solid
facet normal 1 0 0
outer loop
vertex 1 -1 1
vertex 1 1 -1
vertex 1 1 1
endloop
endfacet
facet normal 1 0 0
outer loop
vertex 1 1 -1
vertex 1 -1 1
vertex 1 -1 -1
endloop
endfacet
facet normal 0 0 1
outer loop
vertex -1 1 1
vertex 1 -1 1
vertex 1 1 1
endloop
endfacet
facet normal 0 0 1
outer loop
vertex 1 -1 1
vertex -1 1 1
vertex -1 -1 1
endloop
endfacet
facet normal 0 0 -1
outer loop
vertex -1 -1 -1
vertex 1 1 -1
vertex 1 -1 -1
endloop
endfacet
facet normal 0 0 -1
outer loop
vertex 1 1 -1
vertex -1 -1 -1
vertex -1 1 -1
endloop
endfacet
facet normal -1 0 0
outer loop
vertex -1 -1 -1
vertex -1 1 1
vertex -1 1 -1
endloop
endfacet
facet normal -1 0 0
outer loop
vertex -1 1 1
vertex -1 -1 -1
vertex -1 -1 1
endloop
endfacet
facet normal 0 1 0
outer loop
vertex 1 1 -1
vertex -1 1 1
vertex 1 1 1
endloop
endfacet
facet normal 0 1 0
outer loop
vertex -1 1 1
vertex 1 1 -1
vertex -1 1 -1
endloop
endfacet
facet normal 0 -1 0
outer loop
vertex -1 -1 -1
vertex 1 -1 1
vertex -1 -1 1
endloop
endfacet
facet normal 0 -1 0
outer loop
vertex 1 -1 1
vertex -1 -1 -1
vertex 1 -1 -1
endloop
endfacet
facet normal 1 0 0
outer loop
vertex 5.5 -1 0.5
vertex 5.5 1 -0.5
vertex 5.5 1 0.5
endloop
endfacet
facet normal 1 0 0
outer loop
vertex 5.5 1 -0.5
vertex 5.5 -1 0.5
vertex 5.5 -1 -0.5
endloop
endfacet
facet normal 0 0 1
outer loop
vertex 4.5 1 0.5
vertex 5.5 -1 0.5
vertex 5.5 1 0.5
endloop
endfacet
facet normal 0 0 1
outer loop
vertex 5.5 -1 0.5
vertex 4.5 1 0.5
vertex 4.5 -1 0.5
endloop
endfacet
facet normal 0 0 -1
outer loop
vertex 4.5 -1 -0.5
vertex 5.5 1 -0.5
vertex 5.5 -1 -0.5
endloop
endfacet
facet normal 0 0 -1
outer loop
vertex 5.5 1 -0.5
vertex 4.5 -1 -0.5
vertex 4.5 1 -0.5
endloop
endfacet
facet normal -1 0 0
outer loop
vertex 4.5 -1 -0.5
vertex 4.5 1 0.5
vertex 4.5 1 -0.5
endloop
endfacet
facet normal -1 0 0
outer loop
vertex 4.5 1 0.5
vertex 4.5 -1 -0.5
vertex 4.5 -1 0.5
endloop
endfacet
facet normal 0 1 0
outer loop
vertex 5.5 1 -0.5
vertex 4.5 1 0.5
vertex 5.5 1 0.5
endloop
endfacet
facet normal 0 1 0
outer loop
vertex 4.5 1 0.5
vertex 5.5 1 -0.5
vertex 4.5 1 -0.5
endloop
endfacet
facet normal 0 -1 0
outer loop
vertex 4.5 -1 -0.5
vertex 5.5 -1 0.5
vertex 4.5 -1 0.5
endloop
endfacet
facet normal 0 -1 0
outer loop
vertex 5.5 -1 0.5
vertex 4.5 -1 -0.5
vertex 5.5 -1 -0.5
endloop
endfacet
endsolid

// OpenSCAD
union() {
    cube(size=[2, 2, 2], center=true);
    translate(v=[5, 0, 0]) {
        cube(size=[1, 2, 1], center=true);
    };
};
